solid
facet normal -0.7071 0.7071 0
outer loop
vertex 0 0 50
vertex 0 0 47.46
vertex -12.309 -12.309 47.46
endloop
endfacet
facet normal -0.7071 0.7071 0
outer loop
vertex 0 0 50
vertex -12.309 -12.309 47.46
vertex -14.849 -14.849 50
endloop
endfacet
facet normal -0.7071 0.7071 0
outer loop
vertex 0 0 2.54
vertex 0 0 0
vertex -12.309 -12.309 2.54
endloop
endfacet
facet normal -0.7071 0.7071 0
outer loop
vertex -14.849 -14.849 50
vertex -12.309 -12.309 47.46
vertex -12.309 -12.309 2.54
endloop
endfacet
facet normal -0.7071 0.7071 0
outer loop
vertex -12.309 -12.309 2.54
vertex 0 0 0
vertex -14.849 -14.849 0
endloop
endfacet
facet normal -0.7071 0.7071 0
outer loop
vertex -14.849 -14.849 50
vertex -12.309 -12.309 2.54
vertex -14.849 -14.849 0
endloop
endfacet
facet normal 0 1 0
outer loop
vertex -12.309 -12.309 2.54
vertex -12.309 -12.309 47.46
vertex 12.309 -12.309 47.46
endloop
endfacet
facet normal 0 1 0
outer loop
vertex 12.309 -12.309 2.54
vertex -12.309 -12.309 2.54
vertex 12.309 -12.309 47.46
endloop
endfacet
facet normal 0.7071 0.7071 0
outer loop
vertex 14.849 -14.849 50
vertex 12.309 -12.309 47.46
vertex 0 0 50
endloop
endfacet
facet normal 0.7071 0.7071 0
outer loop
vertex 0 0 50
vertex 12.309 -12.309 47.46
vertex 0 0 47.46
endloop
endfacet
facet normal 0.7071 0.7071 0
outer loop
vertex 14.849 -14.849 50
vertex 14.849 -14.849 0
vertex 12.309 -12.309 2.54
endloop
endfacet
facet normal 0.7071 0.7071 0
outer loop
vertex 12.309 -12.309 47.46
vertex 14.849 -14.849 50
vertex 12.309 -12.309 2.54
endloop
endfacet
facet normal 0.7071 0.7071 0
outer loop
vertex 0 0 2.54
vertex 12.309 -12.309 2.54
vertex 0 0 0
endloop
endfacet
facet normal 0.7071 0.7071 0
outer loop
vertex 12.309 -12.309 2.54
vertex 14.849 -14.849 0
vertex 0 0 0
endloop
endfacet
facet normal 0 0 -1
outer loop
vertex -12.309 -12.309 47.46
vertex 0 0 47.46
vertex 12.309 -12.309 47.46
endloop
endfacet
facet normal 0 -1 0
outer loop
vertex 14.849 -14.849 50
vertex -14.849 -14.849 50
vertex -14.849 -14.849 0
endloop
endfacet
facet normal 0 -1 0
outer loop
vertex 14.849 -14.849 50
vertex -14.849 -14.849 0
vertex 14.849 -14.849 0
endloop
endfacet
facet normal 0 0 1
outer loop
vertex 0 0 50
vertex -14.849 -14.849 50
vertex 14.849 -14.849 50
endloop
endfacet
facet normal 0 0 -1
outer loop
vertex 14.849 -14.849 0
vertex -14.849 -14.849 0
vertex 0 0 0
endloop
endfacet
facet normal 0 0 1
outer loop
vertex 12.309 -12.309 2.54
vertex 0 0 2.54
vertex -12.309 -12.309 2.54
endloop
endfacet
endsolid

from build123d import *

# Parameters (mm, degrees)
F1_DEPTH = 50
F2_T     = -2.54


with BuildPart() as f1:
    # F0 (on Top) → F1 (new body)
    with BuildSketch(Plane.XY):
        Polygon((14.849242, -14.849242), (0, 0), (-14.849242, -14.849242), align=None)
    extrude(amount=F1_DEPTH)

    # F2
    f2_openings = [f1.faces().sort_by_distance(p)[0] for p in [
        (-7.424621, -7.424621, 25),
        (7.424621, -7.424621, 25),
    ]]
    offset(amount=F2_T, openings=f2_openings)


solid = f1.part
